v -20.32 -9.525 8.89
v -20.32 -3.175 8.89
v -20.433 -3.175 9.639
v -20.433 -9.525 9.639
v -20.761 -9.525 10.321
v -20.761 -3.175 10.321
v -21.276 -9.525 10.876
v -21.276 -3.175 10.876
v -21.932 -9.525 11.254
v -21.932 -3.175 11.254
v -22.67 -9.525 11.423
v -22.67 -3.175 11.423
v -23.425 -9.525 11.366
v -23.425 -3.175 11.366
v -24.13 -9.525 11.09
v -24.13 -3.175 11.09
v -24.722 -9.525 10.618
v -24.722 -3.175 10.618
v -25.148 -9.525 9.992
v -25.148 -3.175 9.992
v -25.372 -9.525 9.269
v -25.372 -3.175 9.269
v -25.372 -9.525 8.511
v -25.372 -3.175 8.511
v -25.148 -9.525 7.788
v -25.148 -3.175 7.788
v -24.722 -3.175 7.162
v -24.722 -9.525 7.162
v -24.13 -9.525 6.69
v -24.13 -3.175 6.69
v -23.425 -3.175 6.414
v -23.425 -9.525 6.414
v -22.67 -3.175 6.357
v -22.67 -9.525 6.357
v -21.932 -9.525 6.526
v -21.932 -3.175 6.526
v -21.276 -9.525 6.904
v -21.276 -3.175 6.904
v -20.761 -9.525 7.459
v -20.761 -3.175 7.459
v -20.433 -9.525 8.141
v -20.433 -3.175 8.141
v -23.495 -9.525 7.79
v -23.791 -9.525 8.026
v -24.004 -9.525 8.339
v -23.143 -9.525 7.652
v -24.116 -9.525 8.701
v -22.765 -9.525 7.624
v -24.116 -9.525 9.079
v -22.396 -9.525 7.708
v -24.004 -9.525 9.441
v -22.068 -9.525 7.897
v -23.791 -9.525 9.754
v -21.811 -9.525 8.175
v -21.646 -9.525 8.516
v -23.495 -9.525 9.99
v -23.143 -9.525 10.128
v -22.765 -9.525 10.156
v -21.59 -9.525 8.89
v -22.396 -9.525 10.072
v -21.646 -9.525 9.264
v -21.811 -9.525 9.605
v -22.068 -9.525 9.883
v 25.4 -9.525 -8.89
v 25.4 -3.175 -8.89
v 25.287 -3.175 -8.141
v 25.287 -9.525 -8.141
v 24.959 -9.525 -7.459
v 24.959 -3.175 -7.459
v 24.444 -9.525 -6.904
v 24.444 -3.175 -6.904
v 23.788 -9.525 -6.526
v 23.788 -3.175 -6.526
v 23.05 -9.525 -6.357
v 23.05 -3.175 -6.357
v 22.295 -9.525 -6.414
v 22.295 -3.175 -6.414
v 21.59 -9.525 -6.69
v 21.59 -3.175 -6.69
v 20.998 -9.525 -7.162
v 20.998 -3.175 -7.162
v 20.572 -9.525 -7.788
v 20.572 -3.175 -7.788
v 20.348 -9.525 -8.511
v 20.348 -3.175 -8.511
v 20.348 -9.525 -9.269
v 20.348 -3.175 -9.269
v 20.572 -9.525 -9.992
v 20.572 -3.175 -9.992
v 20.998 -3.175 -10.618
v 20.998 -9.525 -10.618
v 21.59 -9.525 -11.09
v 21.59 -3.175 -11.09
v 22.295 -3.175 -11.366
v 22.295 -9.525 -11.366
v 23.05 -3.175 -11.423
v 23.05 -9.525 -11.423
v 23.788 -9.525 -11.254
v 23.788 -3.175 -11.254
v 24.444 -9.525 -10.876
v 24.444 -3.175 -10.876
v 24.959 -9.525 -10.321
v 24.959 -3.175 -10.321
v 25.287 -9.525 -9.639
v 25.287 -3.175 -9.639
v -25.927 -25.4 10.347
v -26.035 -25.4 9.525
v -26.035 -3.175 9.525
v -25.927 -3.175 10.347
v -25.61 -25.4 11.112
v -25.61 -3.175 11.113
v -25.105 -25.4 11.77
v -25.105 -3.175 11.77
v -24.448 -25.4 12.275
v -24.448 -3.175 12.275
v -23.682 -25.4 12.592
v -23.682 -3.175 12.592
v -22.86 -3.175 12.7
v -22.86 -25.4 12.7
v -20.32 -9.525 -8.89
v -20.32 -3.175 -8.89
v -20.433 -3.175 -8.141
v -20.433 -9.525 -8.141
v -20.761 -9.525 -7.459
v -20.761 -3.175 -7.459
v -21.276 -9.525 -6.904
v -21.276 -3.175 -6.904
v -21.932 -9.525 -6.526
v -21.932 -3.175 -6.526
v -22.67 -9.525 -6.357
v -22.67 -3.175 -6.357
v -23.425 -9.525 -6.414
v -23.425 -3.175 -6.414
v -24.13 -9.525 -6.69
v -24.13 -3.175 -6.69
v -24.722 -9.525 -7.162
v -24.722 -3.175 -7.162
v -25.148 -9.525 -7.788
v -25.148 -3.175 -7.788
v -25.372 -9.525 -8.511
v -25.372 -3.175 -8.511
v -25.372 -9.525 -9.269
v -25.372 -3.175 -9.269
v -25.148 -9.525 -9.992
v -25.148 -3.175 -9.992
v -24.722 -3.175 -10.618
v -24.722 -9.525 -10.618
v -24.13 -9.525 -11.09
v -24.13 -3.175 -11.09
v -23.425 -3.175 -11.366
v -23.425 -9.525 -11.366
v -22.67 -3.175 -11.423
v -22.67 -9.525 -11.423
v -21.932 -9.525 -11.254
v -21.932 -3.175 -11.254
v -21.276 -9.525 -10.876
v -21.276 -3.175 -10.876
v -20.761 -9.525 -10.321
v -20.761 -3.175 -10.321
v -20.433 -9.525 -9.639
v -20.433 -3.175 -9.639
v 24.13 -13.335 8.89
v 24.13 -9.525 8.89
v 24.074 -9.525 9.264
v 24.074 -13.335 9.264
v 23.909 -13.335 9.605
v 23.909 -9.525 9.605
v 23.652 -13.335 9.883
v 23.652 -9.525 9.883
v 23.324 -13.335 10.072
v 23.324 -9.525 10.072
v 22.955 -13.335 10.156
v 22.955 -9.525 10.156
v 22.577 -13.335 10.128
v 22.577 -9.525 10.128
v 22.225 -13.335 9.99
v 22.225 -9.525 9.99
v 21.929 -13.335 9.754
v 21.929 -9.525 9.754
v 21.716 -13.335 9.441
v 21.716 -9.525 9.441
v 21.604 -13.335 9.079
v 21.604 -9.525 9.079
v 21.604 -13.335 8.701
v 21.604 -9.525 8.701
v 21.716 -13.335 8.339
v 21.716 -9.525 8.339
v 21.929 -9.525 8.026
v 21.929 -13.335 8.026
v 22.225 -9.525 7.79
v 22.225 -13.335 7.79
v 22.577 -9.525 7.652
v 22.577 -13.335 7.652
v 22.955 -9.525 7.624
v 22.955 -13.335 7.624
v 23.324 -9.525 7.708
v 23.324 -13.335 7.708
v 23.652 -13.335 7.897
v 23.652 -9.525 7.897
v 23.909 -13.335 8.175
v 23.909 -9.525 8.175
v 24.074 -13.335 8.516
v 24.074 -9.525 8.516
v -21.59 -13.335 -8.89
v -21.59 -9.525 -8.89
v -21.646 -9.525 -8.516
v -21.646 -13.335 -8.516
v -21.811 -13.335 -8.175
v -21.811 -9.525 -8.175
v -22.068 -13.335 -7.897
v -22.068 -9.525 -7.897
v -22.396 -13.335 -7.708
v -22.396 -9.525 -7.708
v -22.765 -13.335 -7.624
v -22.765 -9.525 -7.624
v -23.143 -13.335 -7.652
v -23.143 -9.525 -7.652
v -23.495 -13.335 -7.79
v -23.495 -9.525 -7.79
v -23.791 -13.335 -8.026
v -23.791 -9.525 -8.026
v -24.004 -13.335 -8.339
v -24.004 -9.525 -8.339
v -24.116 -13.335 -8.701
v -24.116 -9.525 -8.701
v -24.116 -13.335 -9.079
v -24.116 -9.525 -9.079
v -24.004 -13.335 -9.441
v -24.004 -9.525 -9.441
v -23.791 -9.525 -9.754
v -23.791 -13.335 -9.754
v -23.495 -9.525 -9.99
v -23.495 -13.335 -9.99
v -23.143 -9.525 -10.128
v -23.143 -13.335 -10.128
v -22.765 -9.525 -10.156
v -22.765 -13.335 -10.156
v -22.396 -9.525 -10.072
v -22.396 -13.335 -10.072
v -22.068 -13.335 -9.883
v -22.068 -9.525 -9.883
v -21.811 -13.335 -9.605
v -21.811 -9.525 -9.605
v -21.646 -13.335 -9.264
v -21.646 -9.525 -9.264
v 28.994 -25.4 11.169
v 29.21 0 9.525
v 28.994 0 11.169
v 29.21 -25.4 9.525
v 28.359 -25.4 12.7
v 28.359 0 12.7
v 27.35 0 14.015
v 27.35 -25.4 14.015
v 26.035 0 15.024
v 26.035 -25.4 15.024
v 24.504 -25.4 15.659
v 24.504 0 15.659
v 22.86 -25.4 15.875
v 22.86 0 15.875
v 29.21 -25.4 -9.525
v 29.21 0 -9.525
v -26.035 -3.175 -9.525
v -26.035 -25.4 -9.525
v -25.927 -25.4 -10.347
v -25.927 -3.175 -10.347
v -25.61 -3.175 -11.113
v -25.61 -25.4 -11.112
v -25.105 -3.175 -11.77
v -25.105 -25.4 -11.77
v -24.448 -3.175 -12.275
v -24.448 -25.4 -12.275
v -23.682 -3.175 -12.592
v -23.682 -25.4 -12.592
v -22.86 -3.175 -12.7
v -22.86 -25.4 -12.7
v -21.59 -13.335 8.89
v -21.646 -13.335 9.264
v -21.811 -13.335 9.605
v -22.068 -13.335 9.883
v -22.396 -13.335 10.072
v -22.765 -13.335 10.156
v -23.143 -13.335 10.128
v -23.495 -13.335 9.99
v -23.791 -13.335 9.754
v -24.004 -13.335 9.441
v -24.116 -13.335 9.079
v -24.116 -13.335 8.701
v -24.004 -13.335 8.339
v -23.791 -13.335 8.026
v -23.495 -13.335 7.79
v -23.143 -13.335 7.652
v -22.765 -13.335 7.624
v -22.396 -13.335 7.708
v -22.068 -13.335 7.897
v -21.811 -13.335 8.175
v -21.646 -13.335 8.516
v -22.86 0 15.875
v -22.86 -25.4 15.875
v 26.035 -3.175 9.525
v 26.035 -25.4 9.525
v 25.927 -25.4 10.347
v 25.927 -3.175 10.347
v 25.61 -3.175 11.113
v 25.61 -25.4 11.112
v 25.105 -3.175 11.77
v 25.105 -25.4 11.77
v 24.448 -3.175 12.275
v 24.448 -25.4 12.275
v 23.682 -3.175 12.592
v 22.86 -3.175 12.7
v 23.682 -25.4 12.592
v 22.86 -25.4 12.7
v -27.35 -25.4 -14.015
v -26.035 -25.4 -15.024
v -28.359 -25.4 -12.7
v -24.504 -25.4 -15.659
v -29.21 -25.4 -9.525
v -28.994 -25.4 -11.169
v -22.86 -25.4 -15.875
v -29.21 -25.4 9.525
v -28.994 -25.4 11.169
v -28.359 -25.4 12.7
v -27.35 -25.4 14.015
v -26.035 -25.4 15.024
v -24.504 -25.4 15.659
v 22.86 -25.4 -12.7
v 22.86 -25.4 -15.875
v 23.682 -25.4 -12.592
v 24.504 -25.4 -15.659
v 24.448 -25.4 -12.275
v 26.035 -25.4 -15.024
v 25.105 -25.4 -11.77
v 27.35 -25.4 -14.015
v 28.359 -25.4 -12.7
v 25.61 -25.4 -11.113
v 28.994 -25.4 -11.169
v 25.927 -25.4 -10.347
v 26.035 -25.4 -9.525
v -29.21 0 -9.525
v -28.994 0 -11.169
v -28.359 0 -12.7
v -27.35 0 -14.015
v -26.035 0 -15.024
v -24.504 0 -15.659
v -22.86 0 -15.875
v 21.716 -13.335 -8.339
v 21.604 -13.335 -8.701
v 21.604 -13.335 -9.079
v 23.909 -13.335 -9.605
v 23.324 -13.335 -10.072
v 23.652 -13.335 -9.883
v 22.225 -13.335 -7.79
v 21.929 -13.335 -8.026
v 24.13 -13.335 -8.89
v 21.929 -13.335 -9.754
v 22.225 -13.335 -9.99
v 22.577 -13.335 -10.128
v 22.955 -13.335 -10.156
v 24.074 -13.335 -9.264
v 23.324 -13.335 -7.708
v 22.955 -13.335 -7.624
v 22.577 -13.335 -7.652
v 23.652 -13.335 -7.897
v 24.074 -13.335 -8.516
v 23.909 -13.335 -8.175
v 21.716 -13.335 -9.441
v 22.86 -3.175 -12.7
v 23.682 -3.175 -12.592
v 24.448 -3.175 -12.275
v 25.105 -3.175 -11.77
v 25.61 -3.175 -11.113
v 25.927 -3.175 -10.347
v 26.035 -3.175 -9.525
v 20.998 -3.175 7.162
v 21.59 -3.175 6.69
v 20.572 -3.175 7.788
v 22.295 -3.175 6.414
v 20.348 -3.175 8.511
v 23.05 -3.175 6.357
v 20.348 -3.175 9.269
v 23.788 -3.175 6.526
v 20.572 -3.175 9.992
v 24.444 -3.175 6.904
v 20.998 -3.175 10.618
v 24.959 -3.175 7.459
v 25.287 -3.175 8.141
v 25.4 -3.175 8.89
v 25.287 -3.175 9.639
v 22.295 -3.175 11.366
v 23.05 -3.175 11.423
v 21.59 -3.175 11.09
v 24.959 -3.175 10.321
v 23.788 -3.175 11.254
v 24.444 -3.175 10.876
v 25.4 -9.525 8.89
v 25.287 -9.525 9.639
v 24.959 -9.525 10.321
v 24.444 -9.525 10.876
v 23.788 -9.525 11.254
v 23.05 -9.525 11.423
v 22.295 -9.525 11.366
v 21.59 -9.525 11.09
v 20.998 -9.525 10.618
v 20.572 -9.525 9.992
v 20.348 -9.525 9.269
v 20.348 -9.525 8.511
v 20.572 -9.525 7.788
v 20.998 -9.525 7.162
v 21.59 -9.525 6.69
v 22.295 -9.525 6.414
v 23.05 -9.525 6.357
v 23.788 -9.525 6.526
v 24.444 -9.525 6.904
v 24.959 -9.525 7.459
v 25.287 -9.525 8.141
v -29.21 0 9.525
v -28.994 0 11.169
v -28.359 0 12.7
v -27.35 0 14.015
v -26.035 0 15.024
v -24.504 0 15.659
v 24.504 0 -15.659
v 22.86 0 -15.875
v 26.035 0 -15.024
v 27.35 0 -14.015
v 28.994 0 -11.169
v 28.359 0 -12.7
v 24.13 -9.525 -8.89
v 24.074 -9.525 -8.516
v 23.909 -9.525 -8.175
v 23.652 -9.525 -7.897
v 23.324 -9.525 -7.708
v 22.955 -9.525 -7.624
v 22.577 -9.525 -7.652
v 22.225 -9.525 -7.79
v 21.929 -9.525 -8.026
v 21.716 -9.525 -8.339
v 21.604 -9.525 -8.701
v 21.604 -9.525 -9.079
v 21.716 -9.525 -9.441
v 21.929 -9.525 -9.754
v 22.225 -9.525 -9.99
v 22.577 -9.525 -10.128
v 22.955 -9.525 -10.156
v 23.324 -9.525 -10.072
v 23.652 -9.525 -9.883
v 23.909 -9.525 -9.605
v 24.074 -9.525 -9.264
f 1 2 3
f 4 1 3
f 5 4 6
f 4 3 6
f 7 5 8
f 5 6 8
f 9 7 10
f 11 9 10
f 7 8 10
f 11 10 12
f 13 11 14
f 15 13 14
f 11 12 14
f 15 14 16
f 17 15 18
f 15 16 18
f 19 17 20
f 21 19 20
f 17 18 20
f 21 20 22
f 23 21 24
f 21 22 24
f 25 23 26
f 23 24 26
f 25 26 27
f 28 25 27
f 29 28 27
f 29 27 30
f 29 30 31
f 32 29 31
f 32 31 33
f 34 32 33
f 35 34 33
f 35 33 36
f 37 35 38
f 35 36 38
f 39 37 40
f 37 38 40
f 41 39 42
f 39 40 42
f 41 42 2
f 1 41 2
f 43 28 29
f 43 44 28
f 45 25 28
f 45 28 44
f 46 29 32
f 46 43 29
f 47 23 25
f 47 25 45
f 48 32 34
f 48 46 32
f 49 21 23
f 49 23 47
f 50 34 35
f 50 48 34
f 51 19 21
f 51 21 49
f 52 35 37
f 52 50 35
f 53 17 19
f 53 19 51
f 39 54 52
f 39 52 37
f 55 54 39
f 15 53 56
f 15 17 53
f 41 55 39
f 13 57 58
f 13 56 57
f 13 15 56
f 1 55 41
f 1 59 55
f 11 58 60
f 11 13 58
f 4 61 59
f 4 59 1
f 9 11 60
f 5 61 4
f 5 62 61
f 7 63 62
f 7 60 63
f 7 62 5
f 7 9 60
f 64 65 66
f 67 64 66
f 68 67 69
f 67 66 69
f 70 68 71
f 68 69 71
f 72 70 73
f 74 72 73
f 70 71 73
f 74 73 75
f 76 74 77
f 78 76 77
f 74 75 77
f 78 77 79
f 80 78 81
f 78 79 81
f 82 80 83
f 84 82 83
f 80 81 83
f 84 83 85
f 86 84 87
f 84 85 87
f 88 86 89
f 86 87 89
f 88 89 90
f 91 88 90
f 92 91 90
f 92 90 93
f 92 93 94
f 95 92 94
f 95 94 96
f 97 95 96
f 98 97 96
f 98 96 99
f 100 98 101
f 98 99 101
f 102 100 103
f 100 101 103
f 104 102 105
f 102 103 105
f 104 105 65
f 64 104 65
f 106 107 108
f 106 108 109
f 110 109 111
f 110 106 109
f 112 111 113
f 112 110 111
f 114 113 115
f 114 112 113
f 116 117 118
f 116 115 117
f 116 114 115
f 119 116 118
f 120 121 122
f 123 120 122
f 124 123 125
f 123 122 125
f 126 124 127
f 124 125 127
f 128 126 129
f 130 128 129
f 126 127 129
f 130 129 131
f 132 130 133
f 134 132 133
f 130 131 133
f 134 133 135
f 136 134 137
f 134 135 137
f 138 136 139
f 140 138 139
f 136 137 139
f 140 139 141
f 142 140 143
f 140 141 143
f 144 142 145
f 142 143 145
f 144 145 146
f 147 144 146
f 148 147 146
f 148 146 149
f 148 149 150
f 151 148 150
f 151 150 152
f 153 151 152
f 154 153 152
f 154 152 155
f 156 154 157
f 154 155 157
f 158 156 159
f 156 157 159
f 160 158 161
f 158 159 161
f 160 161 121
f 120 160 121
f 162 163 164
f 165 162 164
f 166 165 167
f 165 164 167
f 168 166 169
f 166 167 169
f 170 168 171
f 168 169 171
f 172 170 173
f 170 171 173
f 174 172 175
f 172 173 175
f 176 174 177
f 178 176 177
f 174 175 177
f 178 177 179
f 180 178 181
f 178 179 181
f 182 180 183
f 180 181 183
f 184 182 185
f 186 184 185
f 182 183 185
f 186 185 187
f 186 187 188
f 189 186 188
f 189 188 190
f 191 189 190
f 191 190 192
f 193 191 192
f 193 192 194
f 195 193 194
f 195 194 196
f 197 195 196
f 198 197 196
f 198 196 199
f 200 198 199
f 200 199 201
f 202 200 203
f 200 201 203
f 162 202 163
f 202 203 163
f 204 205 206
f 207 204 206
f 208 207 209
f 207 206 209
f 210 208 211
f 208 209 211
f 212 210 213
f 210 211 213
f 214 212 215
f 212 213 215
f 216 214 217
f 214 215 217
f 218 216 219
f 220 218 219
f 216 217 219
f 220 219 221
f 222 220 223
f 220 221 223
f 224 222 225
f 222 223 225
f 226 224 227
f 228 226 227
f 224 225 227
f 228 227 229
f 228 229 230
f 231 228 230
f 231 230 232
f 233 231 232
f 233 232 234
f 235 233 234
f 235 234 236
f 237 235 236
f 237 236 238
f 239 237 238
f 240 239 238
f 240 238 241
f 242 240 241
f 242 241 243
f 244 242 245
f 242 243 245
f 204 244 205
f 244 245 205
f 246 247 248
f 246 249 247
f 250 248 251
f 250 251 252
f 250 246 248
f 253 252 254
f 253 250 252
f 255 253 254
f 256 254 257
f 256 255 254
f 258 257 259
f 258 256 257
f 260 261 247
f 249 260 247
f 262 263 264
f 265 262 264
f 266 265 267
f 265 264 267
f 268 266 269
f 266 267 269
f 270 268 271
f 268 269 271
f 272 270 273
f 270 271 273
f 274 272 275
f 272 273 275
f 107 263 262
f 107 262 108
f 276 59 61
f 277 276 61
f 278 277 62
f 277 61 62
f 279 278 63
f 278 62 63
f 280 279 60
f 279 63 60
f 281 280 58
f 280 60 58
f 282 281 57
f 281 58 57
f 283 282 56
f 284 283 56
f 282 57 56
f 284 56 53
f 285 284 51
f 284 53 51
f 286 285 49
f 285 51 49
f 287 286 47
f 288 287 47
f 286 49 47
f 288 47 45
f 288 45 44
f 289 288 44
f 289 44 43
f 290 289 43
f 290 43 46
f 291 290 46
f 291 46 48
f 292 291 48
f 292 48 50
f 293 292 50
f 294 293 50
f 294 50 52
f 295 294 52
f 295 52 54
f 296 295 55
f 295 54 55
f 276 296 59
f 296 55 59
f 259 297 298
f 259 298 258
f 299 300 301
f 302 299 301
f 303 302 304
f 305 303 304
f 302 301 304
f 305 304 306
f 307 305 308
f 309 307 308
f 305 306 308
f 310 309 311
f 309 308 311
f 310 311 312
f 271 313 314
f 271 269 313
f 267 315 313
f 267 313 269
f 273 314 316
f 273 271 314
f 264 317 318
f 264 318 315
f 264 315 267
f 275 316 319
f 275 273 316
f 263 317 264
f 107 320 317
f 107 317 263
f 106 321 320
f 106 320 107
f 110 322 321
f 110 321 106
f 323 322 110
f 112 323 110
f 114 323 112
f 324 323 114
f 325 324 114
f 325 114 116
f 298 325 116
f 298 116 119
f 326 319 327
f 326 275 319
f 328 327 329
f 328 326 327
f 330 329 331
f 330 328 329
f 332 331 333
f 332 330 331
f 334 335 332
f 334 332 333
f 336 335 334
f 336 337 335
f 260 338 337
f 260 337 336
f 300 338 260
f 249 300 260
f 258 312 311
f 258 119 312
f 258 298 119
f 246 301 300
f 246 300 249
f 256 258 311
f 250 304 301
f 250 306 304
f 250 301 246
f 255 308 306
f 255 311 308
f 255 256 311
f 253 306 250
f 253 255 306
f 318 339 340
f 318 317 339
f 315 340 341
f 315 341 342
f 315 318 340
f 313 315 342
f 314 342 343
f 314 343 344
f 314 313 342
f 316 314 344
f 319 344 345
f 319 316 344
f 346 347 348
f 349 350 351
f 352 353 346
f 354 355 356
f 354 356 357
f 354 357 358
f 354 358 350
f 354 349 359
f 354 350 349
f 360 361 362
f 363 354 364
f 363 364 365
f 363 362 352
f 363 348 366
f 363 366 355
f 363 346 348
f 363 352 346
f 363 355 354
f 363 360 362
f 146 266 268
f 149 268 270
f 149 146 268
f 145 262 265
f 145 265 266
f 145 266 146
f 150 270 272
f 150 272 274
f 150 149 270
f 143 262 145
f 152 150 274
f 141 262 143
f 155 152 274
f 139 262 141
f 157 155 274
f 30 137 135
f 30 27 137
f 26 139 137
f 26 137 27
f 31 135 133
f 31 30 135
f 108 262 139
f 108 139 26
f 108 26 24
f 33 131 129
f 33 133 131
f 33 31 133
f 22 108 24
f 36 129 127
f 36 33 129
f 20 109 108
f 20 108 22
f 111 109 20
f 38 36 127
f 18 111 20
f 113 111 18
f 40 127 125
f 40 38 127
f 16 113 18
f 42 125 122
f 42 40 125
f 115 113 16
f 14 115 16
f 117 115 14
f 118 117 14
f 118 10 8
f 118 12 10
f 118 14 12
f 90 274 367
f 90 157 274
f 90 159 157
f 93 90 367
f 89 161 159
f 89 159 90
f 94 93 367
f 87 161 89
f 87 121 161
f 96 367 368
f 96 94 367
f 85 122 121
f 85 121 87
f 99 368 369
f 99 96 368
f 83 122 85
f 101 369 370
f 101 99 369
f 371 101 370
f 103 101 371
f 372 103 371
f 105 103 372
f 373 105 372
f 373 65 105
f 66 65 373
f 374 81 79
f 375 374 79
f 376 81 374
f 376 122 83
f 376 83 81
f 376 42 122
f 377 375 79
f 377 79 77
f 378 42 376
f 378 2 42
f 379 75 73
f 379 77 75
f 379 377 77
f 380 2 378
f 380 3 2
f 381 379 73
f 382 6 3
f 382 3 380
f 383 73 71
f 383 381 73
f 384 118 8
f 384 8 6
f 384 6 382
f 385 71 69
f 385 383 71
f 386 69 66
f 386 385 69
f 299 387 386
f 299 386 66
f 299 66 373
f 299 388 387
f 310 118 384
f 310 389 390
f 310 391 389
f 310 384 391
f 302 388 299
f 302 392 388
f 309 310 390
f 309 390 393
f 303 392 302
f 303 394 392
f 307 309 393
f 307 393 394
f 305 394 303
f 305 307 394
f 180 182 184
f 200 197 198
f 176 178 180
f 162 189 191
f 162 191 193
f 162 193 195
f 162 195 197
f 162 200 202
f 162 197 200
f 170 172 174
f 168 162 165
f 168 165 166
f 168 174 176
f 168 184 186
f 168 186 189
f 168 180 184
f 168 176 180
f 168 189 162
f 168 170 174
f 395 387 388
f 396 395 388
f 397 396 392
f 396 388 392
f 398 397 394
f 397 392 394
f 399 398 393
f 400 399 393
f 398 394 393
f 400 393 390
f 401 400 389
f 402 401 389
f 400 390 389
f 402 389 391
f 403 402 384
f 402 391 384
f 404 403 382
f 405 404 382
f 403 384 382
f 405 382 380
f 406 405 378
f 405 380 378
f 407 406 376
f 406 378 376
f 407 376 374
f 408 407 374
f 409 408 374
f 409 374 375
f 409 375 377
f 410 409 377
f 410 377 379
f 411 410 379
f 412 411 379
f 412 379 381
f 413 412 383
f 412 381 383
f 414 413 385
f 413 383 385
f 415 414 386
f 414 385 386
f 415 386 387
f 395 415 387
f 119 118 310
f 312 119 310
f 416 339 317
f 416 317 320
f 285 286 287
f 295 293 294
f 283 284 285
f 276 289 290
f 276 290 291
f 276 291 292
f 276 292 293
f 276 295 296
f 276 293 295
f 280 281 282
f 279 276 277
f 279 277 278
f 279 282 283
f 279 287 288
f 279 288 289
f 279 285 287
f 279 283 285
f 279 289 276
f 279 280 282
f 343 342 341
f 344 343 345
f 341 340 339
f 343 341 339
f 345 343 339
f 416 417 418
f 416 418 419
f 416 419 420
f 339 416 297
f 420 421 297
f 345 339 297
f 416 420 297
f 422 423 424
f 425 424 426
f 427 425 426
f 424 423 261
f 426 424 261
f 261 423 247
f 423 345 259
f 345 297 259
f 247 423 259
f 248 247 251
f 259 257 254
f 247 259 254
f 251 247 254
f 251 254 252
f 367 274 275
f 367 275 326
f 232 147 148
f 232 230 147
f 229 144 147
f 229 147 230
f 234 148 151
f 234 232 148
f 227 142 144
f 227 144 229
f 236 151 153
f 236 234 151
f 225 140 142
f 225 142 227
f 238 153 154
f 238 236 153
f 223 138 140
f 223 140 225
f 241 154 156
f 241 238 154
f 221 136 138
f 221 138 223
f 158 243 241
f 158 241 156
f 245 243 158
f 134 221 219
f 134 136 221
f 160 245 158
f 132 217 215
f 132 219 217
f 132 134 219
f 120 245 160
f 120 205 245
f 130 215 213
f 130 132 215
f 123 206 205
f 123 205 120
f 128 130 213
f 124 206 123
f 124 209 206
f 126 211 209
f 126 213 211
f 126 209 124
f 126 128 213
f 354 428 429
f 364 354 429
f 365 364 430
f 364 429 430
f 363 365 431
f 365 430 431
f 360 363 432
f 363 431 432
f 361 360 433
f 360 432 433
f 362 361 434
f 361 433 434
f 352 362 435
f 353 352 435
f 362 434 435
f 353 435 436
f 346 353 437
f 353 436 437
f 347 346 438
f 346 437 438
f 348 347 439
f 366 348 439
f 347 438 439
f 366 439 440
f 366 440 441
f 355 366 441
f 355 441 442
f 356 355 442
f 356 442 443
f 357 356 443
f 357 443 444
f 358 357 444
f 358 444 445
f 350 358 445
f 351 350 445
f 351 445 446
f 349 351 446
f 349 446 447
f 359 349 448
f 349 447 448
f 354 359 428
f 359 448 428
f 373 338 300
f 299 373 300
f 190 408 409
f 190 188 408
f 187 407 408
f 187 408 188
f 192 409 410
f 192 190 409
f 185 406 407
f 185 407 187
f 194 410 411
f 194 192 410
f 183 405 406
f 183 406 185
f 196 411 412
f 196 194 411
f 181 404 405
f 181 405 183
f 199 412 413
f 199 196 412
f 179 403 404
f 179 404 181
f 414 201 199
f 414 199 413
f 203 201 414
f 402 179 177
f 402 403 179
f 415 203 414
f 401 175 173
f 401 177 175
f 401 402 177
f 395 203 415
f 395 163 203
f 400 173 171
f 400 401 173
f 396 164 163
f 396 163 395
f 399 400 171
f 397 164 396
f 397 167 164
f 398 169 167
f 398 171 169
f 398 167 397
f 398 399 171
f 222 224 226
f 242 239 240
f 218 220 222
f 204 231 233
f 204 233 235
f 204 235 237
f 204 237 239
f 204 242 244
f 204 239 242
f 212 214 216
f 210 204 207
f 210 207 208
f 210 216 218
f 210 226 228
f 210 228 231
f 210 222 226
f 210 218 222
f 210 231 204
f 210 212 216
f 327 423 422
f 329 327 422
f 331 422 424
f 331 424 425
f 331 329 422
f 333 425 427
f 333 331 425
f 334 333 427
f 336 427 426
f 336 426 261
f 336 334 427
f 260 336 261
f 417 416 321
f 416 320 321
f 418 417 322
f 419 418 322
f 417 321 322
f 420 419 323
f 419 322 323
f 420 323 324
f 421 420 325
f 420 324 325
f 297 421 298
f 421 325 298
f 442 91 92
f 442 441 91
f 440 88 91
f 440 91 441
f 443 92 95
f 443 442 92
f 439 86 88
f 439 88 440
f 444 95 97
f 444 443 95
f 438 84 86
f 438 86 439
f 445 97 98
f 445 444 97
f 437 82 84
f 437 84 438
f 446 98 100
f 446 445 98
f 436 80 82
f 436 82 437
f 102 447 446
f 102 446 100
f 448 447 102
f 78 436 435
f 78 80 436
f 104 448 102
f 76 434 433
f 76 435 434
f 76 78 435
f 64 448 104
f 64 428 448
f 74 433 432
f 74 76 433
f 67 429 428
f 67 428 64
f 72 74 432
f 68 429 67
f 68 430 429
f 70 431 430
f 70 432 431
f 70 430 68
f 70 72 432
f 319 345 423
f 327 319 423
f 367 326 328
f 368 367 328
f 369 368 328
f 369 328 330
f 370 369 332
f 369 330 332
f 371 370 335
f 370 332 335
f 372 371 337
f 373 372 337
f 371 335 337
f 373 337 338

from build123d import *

# Parameters (mm, degrees)
F0_W     = 58.42
F0_H     = 31.75
F2_DEPTH = 25.4
F3_R     = 6.35
F4_T     = -3.175
F5_R     = 2.54
F6_DEPTH = 6.35
F7_R     = 1.27
F8_DEPTH = 3.81


with BuildPart() as f2:
    # F0 (on Front) → F2 (new body)
    with BuildSketch(Plane.XZ):
        Rectangle(F0_W, F0_H)
    extrude(amount=F2_DEPTH)

    # F3
    f3_edges = [f2.edges().sort_by_distance(p)[0] for p in [
        (29.21, -12.7, 15.875),
        (29.21, -12.7, -15.875),
        (-29.21, -12.7, 15.875),
        (-29.21, -12.7, -15.875),
    ]]
    fillet(f3_edges, radius=F3_R)

    # F4
    f4_openings = [f2.faces().sort_by_distance(p)[0] for p in [
        (0, -25.4, 0),
    ]]
    offset(amount=F4_T, openings=f4_openings)

    # F5 (on face) → F6 (join)
    with BuildSketch(Plane.XZ.offset(3.175)):
        with Locations((-22.86, 8.89)):
            Circle(F5_R)
        with Locations((22.86, 8.89)):
            Circle(F5_R)
        with Locations((-22.86, -8.89)):
            Circle(F5_R)
        with Locations((22.86, -8.89)):
            Circle(F5_R)
    extrude(amount=F6_DEPTH)

    # F7 (on face) → F8 (join)
    with BuildSketch(Plane.XZ.offset(9.525)):
        with Locations((-22.86, 8.89)):
            Circle(F7_R)
        with Locations((-22.86, -8.89)):
            Circle(F7_R)
        with Locations((22.86, -8.89)):
            Circle(F7_R)
        with Locations((22.86, 8.89)):
            Circle(F7_R)
    extrude(amount=F8_DEPTH)


solid = f2.part
